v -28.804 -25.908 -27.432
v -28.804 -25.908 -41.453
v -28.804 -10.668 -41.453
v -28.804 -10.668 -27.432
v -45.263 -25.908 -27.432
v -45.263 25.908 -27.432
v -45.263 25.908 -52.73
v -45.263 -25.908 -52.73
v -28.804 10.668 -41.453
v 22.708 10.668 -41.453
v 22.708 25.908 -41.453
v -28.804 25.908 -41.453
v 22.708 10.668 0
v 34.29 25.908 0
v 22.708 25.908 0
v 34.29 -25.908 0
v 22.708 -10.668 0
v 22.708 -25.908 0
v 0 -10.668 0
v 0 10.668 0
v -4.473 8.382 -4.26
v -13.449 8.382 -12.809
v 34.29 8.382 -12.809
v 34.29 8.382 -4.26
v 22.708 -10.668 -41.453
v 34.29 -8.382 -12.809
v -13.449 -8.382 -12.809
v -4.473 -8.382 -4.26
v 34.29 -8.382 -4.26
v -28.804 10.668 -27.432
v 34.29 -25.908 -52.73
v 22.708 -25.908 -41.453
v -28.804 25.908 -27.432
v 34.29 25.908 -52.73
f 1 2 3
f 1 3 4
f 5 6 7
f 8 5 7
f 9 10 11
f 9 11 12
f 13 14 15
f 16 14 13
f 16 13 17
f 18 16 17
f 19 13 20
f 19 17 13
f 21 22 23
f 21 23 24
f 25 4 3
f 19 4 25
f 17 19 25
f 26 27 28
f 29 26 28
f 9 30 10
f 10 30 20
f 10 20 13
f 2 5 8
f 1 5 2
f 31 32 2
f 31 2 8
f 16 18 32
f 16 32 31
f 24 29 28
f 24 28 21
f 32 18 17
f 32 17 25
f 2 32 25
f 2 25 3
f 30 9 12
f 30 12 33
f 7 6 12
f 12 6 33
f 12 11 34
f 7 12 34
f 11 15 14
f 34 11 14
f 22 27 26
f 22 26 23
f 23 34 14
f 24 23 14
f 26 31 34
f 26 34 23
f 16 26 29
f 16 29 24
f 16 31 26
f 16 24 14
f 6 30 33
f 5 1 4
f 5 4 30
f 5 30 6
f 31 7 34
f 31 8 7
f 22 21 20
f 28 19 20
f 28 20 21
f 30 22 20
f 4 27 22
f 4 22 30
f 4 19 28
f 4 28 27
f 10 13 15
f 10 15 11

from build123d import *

# Parameters (mm, degrees)
F1_DEPTH = 25.908
F2_DEPTH = 10.668
F3_W     = 16.764
F3_H     = 8.548961
F4_DEPTH = 83.312


with BuildPart() as f1:
    # F0 (on Front) → F1 (new body, symmetric)
    with BuildSketch(Plane.XZ):
        Polygon((34.290001, -52.7304), (34.290001, 0), (22.707598, 0), (22.707598, -41.452803), (-28.8036, -41.452803), (-28.8036, -27.432), (-45.262802, -27.432), (-45.262802, -52.7304), align=None)
    extrude(amount=F1_DEPTH, both=True)

    # F0 (on Front) → F2 (join, symmetric)
    with BuildSketch(Plane.XZ):
        Polygon((22.707598, -41.452803), (22.707598, 0), (0, 0), (-28.8036, -27.432), (-28.8036, -41.452803), align=None)
    extrude(amount=F2_DEPTH, both=True)

    # F3 (on face) → F4 (cut)
    with BuildSketch(Plane.YZ.offset(34.290001)):
        with Locations((0, -8.534401)):
            Rectangle(F3_W, F3_H)
    extrude(amount=-F4_DEPTH, mode=Mode.SUBTRACT)


solid = f1.part
